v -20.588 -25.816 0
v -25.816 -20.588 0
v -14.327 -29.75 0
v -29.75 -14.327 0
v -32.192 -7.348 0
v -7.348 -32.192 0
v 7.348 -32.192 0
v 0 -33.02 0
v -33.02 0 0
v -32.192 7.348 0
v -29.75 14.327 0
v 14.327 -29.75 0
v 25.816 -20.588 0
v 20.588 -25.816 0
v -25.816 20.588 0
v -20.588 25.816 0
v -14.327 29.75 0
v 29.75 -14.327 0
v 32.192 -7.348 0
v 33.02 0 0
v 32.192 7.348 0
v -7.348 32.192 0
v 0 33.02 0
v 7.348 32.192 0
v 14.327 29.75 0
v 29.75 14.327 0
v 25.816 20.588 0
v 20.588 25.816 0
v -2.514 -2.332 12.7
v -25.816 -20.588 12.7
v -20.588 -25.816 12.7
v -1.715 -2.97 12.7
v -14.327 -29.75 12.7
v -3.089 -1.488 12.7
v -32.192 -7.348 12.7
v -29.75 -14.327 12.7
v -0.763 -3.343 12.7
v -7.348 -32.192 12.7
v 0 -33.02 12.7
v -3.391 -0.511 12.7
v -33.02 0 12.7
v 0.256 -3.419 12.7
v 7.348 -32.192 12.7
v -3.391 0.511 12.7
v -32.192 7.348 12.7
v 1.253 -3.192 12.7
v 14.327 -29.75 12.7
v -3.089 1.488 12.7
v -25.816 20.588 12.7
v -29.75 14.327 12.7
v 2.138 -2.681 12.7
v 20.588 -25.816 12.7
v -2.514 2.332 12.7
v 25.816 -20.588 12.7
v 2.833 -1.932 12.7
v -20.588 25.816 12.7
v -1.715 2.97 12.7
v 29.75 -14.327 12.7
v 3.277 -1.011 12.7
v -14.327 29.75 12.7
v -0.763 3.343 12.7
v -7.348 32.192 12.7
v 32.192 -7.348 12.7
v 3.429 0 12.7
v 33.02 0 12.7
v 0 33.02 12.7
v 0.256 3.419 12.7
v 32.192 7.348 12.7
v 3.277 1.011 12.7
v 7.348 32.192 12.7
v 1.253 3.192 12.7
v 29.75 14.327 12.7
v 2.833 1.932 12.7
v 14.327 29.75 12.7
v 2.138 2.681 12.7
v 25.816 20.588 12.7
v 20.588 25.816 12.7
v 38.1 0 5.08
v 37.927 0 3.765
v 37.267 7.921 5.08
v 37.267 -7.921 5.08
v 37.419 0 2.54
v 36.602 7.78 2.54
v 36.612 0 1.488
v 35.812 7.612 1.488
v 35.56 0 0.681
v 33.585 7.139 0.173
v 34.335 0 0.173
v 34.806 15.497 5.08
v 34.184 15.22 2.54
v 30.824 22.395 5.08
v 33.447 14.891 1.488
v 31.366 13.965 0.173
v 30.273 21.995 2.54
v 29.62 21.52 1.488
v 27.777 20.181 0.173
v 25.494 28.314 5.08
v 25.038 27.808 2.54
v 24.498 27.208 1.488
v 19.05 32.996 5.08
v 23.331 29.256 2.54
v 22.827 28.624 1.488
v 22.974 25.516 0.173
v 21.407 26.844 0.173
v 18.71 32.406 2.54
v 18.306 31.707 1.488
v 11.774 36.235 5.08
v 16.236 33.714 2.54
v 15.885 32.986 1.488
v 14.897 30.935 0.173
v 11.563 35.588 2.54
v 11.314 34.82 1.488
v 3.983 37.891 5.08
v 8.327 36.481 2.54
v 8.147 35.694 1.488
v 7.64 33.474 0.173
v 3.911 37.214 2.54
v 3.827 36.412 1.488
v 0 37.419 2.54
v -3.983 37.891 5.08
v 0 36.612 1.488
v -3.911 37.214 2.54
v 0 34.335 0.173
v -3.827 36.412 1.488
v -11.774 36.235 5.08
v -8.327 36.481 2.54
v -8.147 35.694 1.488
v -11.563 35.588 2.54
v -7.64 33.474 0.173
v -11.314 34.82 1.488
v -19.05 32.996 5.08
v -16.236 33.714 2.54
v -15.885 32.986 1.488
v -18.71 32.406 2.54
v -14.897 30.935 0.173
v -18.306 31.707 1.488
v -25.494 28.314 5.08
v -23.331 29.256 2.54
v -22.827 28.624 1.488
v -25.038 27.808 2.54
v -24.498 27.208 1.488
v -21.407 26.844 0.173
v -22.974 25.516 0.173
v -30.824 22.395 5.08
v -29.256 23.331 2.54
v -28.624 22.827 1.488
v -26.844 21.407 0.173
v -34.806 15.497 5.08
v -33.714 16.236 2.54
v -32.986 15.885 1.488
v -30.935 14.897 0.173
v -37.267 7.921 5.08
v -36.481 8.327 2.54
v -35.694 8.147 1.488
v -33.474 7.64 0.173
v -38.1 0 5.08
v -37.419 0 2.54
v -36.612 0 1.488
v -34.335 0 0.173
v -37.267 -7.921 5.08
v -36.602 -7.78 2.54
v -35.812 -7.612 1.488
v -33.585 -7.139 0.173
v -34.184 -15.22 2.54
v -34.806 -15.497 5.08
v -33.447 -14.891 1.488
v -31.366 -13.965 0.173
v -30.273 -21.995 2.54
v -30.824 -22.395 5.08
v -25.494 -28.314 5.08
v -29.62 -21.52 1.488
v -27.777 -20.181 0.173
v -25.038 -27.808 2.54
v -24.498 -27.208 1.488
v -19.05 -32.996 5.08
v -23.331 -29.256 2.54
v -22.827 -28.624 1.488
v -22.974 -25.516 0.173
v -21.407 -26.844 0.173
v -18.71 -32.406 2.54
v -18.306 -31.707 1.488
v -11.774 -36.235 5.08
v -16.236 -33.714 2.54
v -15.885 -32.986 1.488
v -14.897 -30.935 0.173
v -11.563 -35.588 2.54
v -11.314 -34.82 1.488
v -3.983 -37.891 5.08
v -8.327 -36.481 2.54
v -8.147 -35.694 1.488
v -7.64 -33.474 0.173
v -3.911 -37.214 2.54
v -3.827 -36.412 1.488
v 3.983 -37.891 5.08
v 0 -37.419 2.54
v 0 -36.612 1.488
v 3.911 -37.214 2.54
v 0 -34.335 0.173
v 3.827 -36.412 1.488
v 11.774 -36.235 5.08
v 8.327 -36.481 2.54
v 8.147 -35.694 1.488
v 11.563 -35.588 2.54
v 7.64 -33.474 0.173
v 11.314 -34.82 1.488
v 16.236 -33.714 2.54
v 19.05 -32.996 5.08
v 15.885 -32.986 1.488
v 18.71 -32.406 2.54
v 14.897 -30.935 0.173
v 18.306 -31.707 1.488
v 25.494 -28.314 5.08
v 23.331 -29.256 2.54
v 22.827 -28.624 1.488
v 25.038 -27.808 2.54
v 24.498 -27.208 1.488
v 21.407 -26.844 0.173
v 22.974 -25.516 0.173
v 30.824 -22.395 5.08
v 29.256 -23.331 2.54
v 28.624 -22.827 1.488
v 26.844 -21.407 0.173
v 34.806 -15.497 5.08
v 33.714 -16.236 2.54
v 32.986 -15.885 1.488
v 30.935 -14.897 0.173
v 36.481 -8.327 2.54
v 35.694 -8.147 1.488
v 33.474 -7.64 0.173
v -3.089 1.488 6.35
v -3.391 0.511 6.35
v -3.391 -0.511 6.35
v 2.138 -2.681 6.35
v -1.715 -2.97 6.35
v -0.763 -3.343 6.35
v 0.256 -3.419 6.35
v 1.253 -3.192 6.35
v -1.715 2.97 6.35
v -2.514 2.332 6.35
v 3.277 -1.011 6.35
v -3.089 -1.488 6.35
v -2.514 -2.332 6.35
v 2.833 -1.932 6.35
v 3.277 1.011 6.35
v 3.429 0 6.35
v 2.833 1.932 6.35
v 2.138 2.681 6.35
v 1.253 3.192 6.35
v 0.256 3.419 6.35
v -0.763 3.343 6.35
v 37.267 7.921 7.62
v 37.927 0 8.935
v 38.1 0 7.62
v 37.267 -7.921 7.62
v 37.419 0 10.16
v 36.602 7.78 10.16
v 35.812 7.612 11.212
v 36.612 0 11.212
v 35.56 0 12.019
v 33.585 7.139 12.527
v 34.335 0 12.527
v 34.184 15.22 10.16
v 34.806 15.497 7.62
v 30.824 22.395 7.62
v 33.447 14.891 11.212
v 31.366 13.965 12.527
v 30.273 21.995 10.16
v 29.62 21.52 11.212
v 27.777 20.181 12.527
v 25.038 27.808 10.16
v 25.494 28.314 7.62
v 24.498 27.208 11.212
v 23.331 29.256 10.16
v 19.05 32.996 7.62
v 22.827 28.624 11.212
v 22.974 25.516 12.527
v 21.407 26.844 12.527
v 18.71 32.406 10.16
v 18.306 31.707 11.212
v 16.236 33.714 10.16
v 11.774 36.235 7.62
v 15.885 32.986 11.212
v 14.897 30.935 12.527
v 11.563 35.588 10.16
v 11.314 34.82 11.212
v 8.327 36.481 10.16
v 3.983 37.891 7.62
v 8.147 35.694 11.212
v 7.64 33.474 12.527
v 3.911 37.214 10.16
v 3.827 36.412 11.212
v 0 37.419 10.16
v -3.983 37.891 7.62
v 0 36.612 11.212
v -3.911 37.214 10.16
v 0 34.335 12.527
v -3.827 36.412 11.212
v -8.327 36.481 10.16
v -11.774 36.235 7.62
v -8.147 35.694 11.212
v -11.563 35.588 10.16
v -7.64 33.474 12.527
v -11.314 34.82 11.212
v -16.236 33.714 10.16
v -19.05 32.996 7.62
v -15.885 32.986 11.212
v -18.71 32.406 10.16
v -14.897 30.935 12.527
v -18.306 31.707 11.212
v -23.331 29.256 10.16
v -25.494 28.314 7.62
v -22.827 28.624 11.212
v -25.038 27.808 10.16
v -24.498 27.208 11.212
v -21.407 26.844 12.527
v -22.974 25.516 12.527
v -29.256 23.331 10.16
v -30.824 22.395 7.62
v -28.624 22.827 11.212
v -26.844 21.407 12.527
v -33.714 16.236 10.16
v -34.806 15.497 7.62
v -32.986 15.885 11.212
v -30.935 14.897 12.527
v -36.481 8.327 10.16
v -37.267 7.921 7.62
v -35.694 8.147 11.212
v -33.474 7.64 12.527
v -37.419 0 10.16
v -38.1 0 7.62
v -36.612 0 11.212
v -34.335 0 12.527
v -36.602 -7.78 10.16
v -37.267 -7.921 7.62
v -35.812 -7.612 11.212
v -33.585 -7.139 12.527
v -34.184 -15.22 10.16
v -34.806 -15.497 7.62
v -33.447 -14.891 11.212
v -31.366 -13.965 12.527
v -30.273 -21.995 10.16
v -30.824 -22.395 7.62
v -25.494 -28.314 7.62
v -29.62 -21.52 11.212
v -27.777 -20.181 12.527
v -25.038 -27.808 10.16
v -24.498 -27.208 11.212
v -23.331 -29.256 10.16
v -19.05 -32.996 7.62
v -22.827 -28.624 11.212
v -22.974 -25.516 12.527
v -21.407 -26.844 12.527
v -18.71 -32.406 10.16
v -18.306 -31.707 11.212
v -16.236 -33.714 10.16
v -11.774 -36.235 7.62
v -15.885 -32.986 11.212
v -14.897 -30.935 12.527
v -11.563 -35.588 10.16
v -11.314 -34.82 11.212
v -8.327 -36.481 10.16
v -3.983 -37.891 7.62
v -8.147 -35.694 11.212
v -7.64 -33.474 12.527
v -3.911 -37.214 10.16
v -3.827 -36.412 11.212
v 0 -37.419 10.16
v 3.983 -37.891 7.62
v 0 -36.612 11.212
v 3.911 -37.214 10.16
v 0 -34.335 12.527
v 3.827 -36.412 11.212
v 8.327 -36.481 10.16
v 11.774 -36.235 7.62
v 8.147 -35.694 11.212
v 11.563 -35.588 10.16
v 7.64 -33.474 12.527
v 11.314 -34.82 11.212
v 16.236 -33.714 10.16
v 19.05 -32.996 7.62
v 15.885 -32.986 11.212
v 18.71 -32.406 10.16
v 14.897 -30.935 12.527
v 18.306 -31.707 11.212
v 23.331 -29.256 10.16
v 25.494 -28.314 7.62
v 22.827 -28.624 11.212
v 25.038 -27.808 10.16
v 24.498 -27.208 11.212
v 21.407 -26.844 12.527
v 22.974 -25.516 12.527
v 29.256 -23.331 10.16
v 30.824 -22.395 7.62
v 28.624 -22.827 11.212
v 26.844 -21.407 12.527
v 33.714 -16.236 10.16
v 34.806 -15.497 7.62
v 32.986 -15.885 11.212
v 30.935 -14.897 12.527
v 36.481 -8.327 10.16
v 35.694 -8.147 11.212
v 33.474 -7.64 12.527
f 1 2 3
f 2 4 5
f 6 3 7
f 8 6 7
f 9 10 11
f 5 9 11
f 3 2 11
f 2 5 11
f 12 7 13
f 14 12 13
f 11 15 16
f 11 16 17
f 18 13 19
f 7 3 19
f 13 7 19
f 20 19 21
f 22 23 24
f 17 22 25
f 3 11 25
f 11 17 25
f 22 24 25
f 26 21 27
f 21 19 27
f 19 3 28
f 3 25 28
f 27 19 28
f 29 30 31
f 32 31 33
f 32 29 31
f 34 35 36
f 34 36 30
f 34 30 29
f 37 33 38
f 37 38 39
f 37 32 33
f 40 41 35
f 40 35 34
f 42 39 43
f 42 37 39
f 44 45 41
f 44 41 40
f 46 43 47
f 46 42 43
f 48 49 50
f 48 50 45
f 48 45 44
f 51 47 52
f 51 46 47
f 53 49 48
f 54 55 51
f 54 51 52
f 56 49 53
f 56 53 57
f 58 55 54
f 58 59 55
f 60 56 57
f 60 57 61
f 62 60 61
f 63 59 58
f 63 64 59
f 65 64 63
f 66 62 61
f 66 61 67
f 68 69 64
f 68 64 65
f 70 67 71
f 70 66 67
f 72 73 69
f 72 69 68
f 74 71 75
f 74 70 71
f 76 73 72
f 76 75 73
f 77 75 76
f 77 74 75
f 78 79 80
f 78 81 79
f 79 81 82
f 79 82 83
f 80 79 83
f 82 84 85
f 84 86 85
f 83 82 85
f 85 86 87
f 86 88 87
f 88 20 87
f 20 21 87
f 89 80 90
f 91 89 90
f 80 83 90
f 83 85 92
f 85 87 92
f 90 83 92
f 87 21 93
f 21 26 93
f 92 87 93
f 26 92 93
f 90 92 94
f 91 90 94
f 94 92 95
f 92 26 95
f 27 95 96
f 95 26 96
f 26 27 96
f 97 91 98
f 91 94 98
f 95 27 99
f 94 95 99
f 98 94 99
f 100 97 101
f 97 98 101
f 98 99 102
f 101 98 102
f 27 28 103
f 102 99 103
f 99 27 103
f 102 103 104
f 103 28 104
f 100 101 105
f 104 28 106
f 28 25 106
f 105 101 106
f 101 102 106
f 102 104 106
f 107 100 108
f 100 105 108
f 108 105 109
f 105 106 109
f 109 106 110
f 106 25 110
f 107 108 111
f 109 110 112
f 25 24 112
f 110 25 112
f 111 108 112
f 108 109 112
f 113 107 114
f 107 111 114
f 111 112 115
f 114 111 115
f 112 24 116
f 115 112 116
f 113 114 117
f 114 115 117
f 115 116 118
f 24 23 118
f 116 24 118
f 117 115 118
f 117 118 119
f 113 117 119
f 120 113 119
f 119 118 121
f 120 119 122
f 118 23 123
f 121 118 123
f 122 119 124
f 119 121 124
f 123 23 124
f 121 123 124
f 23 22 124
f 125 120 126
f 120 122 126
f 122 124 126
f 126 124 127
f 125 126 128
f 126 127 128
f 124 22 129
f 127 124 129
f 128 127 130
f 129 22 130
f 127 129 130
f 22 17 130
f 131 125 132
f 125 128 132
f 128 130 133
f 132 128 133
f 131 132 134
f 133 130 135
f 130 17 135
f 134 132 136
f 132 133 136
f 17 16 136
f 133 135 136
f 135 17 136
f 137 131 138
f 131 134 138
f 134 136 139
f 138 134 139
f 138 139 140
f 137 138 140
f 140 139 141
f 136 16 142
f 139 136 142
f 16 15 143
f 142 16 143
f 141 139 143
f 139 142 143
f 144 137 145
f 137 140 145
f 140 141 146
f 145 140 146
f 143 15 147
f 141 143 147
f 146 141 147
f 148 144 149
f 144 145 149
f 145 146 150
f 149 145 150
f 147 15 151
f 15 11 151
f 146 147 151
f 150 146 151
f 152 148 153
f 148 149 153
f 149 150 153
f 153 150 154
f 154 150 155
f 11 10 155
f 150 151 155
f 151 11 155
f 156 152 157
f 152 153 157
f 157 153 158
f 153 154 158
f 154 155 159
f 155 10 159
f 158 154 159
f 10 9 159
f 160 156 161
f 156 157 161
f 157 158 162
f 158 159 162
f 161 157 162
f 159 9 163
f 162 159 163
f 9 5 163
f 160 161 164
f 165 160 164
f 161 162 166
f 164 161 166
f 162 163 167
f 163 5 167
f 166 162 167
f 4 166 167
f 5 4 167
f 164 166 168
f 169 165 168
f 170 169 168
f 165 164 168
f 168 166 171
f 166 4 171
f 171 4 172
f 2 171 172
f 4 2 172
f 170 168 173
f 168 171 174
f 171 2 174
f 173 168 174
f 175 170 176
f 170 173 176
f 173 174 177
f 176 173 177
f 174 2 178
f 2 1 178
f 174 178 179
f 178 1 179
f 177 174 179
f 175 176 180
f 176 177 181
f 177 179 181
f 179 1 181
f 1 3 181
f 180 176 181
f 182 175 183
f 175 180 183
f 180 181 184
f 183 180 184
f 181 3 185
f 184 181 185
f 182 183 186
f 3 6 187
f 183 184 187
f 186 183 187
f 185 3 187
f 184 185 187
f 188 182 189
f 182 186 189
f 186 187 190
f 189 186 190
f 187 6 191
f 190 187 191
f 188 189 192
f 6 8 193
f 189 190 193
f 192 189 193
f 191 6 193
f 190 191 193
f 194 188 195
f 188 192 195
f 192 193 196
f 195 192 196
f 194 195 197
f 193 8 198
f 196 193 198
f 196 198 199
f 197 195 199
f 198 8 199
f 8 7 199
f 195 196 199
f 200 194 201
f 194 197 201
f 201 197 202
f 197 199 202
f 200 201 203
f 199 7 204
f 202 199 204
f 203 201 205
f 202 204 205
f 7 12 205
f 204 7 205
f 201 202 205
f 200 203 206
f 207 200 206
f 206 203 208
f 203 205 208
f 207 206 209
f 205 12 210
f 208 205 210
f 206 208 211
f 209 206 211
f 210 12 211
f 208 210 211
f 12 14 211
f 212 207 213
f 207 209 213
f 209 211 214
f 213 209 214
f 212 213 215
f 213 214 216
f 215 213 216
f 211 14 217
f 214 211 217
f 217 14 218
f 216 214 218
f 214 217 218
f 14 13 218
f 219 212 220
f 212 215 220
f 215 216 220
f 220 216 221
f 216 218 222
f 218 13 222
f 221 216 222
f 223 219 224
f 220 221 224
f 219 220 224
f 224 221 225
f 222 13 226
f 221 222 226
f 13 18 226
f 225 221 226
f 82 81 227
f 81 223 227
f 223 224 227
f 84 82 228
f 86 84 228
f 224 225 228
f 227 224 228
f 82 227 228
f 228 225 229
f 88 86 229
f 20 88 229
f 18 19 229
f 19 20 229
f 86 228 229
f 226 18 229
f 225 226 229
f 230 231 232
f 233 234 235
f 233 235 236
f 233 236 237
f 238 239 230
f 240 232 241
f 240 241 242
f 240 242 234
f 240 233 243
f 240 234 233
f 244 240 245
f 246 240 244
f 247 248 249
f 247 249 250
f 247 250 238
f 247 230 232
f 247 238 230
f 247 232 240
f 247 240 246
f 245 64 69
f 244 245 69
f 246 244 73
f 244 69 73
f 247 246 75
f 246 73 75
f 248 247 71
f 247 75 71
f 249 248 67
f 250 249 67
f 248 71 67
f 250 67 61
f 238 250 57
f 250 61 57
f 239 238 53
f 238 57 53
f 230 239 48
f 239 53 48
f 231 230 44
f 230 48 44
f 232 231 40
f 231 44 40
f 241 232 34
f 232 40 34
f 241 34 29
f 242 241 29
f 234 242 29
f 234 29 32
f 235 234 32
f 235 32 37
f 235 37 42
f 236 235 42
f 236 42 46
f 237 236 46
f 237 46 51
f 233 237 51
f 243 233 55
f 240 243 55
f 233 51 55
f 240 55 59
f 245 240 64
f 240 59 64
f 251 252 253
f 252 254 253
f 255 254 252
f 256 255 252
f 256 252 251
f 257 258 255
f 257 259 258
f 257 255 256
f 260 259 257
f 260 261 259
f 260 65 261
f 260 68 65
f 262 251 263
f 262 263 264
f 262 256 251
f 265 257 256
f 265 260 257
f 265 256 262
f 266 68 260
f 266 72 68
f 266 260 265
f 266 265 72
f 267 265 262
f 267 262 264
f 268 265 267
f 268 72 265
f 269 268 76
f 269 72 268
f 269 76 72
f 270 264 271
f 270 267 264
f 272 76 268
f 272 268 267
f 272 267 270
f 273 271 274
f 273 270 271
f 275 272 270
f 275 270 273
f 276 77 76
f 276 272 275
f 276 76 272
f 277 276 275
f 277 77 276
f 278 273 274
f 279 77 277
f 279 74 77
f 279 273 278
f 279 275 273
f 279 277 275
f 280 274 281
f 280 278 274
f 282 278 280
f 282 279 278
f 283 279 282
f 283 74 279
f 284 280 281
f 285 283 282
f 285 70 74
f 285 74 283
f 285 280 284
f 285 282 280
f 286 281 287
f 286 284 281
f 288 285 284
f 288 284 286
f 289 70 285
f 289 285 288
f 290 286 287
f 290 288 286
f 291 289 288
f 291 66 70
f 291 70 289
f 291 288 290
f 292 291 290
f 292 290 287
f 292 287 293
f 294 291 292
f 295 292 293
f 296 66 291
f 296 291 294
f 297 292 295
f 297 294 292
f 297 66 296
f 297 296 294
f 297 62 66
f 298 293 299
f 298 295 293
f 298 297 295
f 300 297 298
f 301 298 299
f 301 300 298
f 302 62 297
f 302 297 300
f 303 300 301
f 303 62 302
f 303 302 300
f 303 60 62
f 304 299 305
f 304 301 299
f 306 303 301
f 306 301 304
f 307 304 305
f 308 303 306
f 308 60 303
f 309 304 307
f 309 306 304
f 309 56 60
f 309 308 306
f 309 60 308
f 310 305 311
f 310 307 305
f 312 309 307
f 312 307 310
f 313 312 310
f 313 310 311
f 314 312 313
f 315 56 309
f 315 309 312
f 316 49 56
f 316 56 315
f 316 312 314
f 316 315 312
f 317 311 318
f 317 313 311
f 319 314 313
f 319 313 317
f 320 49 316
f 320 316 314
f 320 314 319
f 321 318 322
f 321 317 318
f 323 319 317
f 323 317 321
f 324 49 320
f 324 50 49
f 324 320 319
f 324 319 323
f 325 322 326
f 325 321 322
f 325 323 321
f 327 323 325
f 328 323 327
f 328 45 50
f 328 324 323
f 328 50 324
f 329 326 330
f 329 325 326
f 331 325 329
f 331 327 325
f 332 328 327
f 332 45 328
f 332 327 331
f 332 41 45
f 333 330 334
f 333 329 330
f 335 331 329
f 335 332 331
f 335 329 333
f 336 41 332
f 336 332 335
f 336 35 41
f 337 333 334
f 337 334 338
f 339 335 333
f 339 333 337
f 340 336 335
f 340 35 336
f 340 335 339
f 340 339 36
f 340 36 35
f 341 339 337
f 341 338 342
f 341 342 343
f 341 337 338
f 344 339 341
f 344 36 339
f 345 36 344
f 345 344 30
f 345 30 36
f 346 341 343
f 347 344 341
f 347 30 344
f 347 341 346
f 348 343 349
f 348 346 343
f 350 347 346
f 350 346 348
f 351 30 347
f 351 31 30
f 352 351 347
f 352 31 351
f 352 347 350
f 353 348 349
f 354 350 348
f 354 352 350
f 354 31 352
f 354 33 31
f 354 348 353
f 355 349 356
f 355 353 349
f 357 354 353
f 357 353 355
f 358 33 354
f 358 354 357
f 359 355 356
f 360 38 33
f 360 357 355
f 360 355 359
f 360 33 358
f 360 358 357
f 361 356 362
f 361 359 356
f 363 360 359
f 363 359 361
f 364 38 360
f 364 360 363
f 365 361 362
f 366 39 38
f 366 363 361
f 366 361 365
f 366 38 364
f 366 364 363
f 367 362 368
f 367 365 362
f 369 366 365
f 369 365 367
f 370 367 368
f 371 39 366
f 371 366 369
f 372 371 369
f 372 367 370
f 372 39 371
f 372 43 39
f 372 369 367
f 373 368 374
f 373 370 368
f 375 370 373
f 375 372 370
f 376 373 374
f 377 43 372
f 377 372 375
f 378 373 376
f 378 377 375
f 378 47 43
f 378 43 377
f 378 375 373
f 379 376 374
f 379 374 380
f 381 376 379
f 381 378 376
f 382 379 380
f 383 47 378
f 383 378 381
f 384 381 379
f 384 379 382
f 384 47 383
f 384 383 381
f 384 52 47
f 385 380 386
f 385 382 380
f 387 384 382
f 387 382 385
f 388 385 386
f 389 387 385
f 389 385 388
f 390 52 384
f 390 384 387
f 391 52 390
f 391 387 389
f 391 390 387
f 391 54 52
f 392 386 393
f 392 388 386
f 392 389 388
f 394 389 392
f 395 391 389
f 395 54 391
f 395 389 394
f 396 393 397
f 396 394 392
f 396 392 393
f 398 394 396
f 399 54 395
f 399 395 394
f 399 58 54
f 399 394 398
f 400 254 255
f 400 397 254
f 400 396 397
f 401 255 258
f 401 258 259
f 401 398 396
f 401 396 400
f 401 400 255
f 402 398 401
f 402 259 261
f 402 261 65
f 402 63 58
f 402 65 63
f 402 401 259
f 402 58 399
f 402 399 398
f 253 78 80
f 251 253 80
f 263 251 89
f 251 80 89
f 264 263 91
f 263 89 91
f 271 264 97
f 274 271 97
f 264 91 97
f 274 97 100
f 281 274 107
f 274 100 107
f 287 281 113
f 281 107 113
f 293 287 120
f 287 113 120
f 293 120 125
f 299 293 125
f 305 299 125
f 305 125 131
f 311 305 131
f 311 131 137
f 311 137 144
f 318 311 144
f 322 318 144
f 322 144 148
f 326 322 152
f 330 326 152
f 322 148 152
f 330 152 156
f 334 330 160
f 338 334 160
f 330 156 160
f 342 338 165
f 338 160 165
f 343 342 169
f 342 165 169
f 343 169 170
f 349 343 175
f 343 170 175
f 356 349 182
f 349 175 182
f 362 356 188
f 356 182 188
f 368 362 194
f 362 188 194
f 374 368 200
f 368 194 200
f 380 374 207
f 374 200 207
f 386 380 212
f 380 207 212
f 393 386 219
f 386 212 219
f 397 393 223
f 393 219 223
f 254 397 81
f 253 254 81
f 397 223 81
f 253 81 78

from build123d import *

# Parameters (mm, degrees)
F0_R     = 38.1
F1_DEPTH = 12.7
F2_R     = 5.08
F3_R     = 3.429
F4_DEPTH = 6.35


with BuildPart() as f1:
    # F0 (on Top) → F1 (new body)
    with BuildSketch(Plane.XY):
        Circle(F0_R)
    extrude(amount=F1_DEPTH)

    # F2
    f2_edges = [f1.edges().sort_by_distance(p)[0] for p in [
        (-38.1, 0, 0),
        (-38.1, 0, 12.7),
    ]]
    fillet(f2_edges, radius=F2_R)

    # F3 (on face) → F4 (cut)
    with BuildSketch(Plane.XY.offset(12.7)):
        Circle(F3_R)
    extrude(amount=-F4_DEPTH, mode=Mode.SUBTRACT)


solid = f1.part
